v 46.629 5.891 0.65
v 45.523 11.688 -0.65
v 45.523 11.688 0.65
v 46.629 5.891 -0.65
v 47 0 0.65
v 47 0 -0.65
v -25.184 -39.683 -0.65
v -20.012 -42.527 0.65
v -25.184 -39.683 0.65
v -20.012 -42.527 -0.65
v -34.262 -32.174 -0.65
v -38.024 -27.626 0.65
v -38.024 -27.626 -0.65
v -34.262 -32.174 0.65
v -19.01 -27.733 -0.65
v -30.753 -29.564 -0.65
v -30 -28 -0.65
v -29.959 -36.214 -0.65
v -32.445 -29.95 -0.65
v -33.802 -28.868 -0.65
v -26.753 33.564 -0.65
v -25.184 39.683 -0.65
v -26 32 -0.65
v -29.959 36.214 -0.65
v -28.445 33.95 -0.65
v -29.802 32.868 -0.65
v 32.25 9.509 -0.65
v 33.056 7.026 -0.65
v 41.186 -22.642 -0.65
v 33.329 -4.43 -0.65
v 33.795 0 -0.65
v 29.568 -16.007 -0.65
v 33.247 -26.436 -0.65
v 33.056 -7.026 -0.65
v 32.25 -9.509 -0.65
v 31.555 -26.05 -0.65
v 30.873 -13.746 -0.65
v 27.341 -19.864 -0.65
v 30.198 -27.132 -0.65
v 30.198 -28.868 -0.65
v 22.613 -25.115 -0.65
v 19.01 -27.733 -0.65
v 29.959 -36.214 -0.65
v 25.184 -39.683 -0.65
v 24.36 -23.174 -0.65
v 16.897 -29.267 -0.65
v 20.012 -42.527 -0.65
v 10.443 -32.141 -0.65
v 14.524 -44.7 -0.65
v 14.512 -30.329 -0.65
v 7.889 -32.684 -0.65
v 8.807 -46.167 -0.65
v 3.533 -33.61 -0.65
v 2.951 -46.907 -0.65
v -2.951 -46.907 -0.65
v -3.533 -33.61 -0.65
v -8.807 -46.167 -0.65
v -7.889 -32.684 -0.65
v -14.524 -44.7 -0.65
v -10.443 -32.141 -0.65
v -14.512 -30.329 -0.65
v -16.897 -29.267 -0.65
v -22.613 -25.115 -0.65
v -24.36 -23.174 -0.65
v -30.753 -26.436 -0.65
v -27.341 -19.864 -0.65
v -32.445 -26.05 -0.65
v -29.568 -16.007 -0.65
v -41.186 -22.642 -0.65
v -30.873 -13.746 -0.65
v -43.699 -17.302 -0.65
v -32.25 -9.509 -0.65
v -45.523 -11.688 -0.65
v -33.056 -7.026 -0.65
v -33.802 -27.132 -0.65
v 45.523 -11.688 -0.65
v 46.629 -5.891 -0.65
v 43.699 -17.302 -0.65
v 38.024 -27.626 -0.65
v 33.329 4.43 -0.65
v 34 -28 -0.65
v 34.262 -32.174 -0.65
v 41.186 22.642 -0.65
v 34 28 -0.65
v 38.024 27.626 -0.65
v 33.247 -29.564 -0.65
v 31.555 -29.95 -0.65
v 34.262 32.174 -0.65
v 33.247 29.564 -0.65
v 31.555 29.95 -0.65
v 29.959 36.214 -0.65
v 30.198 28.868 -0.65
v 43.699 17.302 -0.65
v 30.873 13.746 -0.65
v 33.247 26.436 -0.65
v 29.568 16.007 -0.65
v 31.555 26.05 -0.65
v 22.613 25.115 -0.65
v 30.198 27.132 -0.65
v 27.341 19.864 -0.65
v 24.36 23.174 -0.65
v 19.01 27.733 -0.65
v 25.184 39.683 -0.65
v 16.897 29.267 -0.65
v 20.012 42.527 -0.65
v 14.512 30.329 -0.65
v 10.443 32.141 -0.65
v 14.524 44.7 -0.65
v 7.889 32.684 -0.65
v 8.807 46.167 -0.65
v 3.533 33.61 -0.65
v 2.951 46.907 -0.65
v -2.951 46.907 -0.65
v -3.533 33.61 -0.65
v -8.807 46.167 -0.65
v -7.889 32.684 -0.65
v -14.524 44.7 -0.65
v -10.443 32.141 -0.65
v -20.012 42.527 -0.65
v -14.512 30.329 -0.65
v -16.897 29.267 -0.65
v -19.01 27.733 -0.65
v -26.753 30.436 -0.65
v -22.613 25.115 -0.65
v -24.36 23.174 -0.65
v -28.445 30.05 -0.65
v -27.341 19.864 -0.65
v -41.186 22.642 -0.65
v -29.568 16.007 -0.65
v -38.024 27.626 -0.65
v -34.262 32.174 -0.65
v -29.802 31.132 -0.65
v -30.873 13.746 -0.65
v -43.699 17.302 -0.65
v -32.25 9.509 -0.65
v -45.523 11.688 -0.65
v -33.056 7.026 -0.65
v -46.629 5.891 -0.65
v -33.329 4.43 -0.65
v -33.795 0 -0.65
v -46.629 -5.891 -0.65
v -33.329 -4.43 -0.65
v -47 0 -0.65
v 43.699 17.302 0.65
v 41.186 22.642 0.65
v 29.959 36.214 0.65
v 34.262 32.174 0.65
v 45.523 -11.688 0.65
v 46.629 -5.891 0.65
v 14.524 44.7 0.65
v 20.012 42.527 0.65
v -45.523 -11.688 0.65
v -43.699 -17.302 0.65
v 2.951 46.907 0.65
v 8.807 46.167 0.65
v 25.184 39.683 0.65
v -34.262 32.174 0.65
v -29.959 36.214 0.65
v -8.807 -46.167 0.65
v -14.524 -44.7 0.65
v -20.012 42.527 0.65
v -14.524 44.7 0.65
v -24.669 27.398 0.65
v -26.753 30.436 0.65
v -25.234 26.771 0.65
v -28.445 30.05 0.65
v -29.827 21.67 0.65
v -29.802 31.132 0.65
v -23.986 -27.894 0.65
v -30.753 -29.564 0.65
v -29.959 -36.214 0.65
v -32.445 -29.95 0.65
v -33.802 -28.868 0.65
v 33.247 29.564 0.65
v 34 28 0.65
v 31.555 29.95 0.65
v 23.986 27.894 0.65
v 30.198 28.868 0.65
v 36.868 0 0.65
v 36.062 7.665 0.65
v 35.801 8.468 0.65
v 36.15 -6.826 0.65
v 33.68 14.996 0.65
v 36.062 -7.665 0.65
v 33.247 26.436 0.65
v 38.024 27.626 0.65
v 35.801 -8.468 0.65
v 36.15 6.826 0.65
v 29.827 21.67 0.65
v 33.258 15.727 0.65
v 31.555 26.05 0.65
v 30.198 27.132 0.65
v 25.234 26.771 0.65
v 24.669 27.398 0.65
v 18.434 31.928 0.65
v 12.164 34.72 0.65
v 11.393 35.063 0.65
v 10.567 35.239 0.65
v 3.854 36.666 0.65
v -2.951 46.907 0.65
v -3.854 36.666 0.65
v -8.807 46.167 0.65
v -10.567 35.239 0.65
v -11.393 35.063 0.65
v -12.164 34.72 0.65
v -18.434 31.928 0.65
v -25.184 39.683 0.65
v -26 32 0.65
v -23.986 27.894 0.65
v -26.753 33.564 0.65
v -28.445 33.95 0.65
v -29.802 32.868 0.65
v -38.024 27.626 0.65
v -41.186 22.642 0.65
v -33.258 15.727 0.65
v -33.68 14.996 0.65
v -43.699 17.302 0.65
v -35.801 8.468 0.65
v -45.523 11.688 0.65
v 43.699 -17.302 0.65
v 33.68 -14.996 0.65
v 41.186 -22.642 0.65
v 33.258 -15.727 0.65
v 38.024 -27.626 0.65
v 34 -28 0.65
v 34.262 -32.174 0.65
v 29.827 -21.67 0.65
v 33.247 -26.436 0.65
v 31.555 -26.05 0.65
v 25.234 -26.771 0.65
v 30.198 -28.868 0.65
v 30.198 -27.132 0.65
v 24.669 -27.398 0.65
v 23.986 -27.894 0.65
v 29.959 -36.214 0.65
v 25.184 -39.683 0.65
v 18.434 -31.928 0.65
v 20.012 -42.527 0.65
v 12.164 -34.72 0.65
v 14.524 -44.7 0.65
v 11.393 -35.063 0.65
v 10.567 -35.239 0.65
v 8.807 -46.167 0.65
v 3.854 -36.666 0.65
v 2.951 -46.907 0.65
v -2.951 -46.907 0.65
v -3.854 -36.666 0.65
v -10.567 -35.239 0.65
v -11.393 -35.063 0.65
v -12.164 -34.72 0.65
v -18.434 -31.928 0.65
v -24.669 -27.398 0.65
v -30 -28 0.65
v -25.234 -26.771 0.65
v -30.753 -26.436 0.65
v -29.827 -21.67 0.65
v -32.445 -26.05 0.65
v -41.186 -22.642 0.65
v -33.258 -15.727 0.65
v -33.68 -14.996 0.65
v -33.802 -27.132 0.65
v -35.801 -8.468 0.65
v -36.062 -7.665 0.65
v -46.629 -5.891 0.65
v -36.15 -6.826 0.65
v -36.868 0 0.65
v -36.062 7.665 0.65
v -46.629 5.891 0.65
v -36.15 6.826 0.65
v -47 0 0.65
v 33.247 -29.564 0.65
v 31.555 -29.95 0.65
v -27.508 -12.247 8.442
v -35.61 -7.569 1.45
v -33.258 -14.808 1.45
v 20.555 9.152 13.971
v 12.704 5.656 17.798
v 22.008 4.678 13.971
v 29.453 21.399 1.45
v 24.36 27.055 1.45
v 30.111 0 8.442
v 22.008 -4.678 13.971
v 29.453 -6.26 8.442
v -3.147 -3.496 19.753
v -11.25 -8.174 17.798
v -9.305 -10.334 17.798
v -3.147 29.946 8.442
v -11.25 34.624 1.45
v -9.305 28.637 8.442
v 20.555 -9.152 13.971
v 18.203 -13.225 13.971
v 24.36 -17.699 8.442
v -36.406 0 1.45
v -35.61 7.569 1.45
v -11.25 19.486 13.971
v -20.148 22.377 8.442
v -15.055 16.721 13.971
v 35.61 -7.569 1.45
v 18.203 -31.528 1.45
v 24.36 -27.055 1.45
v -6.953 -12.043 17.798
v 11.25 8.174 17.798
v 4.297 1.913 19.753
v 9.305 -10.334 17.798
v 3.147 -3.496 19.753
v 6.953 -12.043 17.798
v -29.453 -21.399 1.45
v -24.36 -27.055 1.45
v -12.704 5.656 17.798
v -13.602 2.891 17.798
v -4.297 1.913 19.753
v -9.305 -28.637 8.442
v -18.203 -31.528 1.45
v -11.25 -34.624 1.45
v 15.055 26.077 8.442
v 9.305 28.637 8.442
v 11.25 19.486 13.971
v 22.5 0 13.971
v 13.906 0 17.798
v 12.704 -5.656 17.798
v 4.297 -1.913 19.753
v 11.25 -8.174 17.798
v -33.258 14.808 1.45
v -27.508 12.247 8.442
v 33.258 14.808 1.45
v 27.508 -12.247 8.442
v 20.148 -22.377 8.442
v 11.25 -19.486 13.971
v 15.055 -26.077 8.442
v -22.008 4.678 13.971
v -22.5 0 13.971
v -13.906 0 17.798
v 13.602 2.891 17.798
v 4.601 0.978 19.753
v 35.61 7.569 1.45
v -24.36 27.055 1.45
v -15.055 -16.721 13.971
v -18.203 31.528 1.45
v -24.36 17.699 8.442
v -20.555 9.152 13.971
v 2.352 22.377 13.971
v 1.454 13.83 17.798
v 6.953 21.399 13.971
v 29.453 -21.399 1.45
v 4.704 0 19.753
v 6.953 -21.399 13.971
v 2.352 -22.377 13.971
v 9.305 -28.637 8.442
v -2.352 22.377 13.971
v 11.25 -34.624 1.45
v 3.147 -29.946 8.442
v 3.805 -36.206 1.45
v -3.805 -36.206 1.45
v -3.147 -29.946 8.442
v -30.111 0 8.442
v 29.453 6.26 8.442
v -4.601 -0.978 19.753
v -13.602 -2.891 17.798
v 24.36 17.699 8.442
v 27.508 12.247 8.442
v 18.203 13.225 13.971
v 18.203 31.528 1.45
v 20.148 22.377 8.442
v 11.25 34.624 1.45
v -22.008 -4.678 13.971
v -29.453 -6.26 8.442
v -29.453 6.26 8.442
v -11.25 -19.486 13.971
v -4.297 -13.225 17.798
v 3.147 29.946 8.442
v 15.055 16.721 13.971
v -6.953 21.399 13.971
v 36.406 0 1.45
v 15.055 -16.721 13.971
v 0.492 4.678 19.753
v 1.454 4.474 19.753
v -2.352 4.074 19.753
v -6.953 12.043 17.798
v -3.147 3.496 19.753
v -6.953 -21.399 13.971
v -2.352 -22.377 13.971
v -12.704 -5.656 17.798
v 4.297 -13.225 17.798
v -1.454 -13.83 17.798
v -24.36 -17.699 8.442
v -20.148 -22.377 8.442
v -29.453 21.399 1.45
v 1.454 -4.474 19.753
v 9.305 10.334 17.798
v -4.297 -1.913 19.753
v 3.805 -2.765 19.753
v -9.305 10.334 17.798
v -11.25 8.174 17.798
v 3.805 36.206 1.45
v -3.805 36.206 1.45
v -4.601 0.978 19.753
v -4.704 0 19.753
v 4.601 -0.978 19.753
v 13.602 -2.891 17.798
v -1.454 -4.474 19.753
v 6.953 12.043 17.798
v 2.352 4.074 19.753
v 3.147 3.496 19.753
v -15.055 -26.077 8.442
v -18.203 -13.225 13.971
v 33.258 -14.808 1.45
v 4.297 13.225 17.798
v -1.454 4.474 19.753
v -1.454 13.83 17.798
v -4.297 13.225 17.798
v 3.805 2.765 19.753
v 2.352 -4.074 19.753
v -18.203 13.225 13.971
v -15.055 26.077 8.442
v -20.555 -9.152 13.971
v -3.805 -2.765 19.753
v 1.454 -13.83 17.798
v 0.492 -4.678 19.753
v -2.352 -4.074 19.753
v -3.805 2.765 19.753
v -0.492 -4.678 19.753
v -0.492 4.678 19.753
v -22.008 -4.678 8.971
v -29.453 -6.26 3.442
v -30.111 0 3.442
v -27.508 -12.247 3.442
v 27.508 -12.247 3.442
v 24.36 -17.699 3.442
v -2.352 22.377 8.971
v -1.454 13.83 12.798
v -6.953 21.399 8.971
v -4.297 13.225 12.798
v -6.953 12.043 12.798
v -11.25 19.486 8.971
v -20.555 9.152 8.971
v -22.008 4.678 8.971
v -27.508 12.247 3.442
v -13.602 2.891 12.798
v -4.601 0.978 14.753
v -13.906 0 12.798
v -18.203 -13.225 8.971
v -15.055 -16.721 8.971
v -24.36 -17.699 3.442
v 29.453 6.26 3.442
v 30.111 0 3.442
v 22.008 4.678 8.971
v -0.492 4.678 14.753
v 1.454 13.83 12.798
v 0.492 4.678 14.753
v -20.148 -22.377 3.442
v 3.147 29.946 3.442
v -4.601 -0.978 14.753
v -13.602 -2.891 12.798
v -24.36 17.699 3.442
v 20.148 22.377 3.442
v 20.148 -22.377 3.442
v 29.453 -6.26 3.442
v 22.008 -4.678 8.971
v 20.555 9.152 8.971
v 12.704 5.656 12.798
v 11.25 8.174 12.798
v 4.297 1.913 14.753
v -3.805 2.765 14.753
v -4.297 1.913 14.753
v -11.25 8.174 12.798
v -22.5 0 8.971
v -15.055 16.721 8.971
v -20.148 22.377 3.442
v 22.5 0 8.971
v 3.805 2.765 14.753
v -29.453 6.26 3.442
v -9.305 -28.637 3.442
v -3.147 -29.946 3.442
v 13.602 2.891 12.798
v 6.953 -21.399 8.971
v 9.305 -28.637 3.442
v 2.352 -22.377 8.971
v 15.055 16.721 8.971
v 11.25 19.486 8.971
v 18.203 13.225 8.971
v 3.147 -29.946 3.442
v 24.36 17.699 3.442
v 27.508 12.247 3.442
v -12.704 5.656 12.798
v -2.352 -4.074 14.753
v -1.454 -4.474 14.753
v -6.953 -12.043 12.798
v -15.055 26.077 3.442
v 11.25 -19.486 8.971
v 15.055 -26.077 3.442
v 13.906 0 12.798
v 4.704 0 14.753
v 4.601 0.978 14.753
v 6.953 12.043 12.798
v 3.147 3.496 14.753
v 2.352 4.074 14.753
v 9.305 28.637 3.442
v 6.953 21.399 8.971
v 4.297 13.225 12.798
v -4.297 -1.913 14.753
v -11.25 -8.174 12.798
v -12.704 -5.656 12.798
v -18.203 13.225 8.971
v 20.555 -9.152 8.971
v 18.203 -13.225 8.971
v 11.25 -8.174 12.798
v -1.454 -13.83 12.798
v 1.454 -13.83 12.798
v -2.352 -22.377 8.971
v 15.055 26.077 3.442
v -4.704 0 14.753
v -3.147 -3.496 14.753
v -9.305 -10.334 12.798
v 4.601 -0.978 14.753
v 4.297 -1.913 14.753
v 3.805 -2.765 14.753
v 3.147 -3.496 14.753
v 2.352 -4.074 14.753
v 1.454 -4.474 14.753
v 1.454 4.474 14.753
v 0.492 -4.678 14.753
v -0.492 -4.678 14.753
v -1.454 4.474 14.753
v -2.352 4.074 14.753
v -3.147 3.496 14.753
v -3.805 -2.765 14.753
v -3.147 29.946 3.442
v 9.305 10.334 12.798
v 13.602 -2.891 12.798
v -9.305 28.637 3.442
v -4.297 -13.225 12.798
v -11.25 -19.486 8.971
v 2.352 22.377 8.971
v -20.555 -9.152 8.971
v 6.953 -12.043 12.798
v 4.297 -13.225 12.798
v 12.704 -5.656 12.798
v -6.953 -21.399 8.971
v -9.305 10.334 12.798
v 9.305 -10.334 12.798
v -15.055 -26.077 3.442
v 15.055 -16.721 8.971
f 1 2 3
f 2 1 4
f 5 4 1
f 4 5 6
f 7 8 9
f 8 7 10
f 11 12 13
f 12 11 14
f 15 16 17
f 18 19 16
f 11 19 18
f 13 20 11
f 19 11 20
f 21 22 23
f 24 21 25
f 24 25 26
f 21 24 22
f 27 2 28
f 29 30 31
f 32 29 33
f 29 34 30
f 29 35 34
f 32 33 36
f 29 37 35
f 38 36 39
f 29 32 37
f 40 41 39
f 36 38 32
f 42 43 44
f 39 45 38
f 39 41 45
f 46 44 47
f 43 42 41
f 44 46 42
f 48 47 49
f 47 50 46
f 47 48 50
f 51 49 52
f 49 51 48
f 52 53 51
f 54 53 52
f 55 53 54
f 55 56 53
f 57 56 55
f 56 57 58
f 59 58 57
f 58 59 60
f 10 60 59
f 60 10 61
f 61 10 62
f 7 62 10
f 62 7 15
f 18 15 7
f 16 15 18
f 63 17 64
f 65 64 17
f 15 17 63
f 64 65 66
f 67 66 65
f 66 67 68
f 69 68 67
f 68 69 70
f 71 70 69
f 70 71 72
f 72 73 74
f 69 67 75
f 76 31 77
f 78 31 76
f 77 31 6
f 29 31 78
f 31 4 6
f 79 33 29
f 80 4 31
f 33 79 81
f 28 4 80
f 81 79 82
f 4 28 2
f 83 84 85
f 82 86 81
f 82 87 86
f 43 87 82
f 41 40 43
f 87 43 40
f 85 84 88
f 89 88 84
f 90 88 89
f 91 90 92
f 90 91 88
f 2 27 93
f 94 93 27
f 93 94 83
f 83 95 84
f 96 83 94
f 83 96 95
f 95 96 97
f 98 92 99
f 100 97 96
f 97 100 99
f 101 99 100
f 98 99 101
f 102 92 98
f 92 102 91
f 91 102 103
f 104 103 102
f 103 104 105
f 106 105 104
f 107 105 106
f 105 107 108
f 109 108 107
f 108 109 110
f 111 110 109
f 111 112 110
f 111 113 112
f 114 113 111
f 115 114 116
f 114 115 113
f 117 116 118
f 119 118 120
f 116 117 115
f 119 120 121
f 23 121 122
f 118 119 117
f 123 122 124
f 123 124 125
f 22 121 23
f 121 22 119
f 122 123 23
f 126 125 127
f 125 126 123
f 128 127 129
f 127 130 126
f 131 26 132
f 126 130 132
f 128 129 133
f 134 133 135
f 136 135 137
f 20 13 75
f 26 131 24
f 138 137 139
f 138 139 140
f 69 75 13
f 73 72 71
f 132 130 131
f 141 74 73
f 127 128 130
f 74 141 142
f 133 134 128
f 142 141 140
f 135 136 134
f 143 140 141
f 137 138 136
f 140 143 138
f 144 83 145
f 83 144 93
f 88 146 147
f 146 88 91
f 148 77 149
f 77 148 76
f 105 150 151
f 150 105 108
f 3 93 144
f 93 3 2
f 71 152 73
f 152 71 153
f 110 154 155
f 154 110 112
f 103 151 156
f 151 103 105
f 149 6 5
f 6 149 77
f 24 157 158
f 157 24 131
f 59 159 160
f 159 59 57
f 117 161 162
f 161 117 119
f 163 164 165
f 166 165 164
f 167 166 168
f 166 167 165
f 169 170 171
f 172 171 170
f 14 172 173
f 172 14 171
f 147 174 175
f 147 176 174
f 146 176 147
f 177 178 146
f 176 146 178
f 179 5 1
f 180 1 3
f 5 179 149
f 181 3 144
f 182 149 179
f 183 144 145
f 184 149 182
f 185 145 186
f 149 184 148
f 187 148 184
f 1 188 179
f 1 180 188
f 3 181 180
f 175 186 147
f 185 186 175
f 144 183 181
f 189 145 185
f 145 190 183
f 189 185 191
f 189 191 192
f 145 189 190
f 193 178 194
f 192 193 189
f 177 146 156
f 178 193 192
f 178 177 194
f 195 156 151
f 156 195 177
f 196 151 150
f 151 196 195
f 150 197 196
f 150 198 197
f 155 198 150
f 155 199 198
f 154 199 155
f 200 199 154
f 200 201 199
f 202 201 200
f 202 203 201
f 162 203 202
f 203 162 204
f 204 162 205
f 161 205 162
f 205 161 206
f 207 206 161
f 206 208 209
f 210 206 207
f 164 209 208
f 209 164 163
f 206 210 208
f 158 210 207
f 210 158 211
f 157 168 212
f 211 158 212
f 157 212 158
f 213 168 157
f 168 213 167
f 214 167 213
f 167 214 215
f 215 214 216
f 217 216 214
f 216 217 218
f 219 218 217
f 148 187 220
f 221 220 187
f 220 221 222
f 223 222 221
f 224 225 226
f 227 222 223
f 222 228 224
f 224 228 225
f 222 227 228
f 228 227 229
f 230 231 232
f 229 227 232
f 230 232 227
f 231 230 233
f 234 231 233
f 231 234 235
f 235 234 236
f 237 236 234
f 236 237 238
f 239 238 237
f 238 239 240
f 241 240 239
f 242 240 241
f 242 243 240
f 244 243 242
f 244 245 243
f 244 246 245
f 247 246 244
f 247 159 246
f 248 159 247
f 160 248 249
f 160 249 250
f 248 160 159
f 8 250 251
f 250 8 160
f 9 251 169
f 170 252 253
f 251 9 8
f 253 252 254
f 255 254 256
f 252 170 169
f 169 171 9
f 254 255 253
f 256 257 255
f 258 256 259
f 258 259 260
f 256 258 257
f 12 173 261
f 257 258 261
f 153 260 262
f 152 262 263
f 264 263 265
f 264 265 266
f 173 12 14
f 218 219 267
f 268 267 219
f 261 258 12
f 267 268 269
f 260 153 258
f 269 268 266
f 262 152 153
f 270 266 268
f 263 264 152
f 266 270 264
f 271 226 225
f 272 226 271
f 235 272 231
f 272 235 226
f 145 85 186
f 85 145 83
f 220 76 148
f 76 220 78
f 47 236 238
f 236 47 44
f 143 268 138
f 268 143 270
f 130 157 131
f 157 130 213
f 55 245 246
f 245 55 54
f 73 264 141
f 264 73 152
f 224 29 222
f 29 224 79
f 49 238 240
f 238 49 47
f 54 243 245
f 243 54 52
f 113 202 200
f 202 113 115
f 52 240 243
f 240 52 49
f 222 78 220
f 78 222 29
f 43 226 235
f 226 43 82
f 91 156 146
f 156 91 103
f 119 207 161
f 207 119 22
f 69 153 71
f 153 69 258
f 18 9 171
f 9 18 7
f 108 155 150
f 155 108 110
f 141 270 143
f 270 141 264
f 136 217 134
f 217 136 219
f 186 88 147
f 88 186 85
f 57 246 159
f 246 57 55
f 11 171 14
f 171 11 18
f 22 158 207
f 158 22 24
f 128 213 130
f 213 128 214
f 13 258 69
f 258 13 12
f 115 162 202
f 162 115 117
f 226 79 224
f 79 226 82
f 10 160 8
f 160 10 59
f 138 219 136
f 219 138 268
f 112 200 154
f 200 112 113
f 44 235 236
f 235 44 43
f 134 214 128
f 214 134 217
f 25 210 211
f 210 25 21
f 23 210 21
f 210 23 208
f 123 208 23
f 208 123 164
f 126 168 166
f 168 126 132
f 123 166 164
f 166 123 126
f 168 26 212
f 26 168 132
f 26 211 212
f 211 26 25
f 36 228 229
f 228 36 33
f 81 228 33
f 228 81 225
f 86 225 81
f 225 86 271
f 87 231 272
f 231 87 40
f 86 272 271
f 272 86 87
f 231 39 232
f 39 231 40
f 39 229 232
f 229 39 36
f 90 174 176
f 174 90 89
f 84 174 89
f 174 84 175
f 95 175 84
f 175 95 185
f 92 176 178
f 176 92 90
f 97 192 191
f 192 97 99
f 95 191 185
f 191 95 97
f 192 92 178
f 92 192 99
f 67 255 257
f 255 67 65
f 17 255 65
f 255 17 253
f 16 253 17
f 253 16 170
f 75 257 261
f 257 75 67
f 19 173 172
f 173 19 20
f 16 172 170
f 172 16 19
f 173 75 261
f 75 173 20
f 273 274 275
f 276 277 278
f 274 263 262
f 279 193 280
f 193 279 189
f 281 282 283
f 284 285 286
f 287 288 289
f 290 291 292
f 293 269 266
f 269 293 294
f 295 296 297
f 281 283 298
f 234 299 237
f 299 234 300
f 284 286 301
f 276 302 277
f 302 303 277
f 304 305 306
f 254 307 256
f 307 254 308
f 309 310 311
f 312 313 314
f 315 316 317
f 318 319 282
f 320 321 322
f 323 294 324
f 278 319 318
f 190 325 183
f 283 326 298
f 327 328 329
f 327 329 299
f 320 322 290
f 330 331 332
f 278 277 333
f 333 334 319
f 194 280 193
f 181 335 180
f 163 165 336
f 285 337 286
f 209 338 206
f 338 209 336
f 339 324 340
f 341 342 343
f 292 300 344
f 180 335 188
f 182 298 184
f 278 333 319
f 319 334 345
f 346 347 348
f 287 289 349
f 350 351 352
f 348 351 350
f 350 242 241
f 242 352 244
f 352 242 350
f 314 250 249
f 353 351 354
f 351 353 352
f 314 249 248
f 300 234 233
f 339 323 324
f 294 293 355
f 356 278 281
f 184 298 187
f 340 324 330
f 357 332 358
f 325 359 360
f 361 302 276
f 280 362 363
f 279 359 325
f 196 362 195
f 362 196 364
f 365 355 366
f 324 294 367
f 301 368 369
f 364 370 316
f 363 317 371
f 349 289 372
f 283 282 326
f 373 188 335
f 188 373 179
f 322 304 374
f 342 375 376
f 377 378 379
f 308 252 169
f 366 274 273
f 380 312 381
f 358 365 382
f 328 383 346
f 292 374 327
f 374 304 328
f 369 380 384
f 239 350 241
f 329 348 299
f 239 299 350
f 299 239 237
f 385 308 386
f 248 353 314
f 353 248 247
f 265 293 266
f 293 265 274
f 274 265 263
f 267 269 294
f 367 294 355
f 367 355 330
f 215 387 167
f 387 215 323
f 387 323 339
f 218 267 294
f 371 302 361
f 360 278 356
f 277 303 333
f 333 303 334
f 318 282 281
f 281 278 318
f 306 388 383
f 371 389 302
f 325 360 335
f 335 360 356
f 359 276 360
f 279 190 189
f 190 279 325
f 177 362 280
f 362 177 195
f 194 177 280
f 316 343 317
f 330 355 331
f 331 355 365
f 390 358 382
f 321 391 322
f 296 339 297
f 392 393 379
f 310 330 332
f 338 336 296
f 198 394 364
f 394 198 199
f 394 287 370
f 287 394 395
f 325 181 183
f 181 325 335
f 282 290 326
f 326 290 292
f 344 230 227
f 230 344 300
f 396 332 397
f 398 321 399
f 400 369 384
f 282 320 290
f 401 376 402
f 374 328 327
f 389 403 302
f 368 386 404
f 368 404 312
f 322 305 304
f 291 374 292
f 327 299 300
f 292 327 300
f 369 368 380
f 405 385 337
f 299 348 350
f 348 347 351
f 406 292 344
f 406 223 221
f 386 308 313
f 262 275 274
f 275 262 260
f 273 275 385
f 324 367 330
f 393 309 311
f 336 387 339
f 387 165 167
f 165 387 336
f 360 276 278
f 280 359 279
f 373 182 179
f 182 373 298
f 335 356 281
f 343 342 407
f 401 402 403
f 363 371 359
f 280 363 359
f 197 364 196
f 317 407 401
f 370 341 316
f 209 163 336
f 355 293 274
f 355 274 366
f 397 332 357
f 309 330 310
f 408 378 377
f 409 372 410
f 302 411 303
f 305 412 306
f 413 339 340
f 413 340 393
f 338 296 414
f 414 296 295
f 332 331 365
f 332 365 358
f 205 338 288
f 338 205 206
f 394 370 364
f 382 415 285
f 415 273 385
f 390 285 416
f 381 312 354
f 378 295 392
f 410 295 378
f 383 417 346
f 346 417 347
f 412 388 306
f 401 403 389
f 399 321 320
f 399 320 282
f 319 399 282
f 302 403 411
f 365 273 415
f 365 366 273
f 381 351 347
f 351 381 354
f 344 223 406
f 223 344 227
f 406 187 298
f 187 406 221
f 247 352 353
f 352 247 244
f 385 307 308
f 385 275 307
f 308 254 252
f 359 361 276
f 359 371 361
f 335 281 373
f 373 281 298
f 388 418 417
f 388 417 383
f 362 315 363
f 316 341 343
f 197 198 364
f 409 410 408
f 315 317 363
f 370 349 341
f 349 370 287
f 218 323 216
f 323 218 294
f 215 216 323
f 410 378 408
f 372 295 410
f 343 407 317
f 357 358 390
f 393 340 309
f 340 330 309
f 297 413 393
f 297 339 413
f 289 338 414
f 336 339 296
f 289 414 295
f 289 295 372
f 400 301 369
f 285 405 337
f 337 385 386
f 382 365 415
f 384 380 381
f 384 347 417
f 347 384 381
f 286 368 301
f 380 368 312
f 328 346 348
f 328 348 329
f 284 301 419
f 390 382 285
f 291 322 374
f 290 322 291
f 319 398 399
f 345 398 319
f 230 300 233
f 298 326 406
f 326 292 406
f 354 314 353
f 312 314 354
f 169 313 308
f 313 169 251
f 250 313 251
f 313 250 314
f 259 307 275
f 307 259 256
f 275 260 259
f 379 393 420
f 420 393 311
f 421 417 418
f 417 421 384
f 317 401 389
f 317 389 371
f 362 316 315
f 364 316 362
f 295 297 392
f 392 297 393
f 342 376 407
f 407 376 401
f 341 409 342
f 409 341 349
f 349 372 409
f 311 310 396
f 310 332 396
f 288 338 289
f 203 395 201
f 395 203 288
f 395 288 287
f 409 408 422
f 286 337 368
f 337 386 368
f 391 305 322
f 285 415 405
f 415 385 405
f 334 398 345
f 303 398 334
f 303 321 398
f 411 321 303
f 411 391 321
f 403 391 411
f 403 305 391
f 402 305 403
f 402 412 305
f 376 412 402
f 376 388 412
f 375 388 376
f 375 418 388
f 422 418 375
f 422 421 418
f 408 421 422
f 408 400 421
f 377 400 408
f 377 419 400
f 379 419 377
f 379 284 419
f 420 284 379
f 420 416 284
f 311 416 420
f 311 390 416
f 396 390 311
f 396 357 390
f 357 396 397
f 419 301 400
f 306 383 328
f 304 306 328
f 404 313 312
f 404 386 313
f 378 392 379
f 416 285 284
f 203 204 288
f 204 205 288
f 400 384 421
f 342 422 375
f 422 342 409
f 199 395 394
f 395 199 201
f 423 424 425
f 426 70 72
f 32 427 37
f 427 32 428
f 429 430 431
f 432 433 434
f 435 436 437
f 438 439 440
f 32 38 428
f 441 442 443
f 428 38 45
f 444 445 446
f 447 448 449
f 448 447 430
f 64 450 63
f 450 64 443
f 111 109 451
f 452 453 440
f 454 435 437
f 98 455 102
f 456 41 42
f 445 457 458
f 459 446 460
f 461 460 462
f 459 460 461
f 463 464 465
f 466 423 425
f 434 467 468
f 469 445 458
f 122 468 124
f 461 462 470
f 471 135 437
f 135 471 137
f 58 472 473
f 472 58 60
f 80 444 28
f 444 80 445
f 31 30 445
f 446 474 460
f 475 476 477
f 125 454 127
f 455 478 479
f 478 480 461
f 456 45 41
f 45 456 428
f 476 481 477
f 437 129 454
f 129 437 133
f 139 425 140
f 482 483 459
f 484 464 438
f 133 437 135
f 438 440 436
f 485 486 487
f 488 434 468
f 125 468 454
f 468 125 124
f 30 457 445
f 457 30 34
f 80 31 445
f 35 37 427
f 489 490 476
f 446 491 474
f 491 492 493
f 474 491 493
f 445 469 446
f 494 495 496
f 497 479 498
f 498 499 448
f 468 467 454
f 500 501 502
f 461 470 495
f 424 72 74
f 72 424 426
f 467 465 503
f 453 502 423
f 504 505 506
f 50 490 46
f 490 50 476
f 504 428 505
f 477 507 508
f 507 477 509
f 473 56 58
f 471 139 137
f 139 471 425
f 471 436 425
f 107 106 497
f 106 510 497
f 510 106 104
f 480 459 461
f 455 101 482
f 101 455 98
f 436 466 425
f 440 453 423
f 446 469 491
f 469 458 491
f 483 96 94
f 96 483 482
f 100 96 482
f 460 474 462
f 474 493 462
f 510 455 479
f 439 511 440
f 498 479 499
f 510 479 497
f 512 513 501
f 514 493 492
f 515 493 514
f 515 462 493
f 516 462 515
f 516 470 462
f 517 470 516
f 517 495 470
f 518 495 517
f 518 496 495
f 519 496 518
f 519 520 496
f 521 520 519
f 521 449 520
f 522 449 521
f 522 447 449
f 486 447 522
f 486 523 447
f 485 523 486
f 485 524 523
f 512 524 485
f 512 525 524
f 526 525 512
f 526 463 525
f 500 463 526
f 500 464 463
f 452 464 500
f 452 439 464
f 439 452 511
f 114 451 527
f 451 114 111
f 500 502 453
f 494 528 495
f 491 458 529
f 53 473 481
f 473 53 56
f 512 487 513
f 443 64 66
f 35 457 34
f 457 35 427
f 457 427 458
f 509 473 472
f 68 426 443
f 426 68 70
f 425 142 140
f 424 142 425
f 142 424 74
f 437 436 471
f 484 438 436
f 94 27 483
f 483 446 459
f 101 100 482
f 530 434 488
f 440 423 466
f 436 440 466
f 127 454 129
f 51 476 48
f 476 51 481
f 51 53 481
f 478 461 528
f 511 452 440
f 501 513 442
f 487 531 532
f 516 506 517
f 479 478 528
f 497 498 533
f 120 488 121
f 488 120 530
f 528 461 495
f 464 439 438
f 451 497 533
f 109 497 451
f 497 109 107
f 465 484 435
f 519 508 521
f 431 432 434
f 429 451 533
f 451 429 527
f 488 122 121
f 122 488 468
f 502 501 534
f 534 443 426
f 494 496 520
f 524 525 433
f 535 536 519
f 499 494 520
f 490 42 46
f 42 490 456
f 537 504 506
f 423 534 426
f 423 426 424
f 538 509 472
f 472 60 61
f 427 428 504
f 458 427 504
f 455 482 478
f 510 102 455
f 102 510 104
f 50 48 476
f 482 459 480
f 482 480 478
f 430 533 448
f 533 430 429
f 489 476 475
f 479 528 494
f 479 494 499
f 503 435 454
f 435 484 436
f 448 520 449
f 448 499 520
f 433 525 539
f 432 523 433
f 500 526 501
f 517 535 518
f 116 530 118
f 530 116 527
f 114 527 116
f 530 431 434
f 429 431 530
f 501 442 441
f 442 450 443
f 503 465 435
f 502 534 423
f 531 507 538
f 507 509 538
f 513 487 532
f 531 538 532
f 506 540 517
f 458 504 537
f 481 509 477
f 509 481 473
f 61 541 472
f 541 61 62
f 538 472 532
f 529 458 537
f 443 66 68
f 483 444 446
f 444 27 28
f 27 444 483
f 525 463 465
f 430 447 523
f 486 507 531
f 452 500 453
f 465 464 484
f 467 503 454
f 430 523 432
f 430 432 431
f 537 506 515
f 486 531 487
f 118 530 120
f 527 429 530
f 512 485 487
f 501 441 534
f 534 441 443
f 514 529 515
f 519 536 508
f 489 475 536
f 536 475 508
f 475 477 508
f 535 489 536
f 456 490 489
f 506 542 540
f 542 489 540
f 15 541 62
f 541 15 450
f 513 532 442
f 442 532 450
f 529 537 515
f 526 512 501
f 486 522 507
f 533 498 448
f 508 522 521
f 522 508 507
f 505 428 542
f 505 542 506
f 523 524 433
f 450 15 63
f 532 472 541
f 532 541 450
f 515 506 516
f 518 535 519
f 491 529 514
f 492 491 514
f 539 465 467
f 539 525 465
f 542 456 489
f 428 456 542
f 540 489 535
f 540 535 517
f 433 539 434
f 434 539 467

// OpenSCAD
module conjunto(){
    
  
    difference(){
        union(){    
                difference(){ 
                     baseCilindro();
                }
                difference(){ 
                    covertura(r = 45, h = 20, both = false, center = false, $fn = 30);
                    translate([0,0,-35]){
                        cube([100,100,70], center = true); 
                    }
                }                   
        }
         translate([0,0,-15]){
         covertura(r=45, h=30, both=false, center=false, $fn=30);
        
    }
        
    
}
}


conjunto();



module baseCilindro(){
       
    difference(){
                
        cylinder(h=1.3, r = 47, center = true, $fn=50); //cilindro principal
                translate([-28, 32, 0]) //posicion
                agujeroCilindro(); //creo el agujero
                translate([32, -28, 0])
                agujeroCilindro();
                translate([32, 28, 0])
                agujeroCilindro();
                translate([-32, -28, 0])
                agujeroCilindro();
        }
               
}

module covertura(r = 4, h = 20, center = false, both = false, $fn = 30)
{
    hc = (both == true) ? h - 2 * r : h - r;
    posc = (center == true) ? 0 : h/2;  
      
    translate([0, 0, posc]) 
    translate([0, 0, -h/2]) {
        cylinder(r = 45, h = hc, $fn = 30);
        translate([0, 0, hc]) 
        sphere(r = 45, $fn = 30);
     }
}

module agujeroCilindro(){
    cylinder(h=1.5, r = 2, center = true);
}
